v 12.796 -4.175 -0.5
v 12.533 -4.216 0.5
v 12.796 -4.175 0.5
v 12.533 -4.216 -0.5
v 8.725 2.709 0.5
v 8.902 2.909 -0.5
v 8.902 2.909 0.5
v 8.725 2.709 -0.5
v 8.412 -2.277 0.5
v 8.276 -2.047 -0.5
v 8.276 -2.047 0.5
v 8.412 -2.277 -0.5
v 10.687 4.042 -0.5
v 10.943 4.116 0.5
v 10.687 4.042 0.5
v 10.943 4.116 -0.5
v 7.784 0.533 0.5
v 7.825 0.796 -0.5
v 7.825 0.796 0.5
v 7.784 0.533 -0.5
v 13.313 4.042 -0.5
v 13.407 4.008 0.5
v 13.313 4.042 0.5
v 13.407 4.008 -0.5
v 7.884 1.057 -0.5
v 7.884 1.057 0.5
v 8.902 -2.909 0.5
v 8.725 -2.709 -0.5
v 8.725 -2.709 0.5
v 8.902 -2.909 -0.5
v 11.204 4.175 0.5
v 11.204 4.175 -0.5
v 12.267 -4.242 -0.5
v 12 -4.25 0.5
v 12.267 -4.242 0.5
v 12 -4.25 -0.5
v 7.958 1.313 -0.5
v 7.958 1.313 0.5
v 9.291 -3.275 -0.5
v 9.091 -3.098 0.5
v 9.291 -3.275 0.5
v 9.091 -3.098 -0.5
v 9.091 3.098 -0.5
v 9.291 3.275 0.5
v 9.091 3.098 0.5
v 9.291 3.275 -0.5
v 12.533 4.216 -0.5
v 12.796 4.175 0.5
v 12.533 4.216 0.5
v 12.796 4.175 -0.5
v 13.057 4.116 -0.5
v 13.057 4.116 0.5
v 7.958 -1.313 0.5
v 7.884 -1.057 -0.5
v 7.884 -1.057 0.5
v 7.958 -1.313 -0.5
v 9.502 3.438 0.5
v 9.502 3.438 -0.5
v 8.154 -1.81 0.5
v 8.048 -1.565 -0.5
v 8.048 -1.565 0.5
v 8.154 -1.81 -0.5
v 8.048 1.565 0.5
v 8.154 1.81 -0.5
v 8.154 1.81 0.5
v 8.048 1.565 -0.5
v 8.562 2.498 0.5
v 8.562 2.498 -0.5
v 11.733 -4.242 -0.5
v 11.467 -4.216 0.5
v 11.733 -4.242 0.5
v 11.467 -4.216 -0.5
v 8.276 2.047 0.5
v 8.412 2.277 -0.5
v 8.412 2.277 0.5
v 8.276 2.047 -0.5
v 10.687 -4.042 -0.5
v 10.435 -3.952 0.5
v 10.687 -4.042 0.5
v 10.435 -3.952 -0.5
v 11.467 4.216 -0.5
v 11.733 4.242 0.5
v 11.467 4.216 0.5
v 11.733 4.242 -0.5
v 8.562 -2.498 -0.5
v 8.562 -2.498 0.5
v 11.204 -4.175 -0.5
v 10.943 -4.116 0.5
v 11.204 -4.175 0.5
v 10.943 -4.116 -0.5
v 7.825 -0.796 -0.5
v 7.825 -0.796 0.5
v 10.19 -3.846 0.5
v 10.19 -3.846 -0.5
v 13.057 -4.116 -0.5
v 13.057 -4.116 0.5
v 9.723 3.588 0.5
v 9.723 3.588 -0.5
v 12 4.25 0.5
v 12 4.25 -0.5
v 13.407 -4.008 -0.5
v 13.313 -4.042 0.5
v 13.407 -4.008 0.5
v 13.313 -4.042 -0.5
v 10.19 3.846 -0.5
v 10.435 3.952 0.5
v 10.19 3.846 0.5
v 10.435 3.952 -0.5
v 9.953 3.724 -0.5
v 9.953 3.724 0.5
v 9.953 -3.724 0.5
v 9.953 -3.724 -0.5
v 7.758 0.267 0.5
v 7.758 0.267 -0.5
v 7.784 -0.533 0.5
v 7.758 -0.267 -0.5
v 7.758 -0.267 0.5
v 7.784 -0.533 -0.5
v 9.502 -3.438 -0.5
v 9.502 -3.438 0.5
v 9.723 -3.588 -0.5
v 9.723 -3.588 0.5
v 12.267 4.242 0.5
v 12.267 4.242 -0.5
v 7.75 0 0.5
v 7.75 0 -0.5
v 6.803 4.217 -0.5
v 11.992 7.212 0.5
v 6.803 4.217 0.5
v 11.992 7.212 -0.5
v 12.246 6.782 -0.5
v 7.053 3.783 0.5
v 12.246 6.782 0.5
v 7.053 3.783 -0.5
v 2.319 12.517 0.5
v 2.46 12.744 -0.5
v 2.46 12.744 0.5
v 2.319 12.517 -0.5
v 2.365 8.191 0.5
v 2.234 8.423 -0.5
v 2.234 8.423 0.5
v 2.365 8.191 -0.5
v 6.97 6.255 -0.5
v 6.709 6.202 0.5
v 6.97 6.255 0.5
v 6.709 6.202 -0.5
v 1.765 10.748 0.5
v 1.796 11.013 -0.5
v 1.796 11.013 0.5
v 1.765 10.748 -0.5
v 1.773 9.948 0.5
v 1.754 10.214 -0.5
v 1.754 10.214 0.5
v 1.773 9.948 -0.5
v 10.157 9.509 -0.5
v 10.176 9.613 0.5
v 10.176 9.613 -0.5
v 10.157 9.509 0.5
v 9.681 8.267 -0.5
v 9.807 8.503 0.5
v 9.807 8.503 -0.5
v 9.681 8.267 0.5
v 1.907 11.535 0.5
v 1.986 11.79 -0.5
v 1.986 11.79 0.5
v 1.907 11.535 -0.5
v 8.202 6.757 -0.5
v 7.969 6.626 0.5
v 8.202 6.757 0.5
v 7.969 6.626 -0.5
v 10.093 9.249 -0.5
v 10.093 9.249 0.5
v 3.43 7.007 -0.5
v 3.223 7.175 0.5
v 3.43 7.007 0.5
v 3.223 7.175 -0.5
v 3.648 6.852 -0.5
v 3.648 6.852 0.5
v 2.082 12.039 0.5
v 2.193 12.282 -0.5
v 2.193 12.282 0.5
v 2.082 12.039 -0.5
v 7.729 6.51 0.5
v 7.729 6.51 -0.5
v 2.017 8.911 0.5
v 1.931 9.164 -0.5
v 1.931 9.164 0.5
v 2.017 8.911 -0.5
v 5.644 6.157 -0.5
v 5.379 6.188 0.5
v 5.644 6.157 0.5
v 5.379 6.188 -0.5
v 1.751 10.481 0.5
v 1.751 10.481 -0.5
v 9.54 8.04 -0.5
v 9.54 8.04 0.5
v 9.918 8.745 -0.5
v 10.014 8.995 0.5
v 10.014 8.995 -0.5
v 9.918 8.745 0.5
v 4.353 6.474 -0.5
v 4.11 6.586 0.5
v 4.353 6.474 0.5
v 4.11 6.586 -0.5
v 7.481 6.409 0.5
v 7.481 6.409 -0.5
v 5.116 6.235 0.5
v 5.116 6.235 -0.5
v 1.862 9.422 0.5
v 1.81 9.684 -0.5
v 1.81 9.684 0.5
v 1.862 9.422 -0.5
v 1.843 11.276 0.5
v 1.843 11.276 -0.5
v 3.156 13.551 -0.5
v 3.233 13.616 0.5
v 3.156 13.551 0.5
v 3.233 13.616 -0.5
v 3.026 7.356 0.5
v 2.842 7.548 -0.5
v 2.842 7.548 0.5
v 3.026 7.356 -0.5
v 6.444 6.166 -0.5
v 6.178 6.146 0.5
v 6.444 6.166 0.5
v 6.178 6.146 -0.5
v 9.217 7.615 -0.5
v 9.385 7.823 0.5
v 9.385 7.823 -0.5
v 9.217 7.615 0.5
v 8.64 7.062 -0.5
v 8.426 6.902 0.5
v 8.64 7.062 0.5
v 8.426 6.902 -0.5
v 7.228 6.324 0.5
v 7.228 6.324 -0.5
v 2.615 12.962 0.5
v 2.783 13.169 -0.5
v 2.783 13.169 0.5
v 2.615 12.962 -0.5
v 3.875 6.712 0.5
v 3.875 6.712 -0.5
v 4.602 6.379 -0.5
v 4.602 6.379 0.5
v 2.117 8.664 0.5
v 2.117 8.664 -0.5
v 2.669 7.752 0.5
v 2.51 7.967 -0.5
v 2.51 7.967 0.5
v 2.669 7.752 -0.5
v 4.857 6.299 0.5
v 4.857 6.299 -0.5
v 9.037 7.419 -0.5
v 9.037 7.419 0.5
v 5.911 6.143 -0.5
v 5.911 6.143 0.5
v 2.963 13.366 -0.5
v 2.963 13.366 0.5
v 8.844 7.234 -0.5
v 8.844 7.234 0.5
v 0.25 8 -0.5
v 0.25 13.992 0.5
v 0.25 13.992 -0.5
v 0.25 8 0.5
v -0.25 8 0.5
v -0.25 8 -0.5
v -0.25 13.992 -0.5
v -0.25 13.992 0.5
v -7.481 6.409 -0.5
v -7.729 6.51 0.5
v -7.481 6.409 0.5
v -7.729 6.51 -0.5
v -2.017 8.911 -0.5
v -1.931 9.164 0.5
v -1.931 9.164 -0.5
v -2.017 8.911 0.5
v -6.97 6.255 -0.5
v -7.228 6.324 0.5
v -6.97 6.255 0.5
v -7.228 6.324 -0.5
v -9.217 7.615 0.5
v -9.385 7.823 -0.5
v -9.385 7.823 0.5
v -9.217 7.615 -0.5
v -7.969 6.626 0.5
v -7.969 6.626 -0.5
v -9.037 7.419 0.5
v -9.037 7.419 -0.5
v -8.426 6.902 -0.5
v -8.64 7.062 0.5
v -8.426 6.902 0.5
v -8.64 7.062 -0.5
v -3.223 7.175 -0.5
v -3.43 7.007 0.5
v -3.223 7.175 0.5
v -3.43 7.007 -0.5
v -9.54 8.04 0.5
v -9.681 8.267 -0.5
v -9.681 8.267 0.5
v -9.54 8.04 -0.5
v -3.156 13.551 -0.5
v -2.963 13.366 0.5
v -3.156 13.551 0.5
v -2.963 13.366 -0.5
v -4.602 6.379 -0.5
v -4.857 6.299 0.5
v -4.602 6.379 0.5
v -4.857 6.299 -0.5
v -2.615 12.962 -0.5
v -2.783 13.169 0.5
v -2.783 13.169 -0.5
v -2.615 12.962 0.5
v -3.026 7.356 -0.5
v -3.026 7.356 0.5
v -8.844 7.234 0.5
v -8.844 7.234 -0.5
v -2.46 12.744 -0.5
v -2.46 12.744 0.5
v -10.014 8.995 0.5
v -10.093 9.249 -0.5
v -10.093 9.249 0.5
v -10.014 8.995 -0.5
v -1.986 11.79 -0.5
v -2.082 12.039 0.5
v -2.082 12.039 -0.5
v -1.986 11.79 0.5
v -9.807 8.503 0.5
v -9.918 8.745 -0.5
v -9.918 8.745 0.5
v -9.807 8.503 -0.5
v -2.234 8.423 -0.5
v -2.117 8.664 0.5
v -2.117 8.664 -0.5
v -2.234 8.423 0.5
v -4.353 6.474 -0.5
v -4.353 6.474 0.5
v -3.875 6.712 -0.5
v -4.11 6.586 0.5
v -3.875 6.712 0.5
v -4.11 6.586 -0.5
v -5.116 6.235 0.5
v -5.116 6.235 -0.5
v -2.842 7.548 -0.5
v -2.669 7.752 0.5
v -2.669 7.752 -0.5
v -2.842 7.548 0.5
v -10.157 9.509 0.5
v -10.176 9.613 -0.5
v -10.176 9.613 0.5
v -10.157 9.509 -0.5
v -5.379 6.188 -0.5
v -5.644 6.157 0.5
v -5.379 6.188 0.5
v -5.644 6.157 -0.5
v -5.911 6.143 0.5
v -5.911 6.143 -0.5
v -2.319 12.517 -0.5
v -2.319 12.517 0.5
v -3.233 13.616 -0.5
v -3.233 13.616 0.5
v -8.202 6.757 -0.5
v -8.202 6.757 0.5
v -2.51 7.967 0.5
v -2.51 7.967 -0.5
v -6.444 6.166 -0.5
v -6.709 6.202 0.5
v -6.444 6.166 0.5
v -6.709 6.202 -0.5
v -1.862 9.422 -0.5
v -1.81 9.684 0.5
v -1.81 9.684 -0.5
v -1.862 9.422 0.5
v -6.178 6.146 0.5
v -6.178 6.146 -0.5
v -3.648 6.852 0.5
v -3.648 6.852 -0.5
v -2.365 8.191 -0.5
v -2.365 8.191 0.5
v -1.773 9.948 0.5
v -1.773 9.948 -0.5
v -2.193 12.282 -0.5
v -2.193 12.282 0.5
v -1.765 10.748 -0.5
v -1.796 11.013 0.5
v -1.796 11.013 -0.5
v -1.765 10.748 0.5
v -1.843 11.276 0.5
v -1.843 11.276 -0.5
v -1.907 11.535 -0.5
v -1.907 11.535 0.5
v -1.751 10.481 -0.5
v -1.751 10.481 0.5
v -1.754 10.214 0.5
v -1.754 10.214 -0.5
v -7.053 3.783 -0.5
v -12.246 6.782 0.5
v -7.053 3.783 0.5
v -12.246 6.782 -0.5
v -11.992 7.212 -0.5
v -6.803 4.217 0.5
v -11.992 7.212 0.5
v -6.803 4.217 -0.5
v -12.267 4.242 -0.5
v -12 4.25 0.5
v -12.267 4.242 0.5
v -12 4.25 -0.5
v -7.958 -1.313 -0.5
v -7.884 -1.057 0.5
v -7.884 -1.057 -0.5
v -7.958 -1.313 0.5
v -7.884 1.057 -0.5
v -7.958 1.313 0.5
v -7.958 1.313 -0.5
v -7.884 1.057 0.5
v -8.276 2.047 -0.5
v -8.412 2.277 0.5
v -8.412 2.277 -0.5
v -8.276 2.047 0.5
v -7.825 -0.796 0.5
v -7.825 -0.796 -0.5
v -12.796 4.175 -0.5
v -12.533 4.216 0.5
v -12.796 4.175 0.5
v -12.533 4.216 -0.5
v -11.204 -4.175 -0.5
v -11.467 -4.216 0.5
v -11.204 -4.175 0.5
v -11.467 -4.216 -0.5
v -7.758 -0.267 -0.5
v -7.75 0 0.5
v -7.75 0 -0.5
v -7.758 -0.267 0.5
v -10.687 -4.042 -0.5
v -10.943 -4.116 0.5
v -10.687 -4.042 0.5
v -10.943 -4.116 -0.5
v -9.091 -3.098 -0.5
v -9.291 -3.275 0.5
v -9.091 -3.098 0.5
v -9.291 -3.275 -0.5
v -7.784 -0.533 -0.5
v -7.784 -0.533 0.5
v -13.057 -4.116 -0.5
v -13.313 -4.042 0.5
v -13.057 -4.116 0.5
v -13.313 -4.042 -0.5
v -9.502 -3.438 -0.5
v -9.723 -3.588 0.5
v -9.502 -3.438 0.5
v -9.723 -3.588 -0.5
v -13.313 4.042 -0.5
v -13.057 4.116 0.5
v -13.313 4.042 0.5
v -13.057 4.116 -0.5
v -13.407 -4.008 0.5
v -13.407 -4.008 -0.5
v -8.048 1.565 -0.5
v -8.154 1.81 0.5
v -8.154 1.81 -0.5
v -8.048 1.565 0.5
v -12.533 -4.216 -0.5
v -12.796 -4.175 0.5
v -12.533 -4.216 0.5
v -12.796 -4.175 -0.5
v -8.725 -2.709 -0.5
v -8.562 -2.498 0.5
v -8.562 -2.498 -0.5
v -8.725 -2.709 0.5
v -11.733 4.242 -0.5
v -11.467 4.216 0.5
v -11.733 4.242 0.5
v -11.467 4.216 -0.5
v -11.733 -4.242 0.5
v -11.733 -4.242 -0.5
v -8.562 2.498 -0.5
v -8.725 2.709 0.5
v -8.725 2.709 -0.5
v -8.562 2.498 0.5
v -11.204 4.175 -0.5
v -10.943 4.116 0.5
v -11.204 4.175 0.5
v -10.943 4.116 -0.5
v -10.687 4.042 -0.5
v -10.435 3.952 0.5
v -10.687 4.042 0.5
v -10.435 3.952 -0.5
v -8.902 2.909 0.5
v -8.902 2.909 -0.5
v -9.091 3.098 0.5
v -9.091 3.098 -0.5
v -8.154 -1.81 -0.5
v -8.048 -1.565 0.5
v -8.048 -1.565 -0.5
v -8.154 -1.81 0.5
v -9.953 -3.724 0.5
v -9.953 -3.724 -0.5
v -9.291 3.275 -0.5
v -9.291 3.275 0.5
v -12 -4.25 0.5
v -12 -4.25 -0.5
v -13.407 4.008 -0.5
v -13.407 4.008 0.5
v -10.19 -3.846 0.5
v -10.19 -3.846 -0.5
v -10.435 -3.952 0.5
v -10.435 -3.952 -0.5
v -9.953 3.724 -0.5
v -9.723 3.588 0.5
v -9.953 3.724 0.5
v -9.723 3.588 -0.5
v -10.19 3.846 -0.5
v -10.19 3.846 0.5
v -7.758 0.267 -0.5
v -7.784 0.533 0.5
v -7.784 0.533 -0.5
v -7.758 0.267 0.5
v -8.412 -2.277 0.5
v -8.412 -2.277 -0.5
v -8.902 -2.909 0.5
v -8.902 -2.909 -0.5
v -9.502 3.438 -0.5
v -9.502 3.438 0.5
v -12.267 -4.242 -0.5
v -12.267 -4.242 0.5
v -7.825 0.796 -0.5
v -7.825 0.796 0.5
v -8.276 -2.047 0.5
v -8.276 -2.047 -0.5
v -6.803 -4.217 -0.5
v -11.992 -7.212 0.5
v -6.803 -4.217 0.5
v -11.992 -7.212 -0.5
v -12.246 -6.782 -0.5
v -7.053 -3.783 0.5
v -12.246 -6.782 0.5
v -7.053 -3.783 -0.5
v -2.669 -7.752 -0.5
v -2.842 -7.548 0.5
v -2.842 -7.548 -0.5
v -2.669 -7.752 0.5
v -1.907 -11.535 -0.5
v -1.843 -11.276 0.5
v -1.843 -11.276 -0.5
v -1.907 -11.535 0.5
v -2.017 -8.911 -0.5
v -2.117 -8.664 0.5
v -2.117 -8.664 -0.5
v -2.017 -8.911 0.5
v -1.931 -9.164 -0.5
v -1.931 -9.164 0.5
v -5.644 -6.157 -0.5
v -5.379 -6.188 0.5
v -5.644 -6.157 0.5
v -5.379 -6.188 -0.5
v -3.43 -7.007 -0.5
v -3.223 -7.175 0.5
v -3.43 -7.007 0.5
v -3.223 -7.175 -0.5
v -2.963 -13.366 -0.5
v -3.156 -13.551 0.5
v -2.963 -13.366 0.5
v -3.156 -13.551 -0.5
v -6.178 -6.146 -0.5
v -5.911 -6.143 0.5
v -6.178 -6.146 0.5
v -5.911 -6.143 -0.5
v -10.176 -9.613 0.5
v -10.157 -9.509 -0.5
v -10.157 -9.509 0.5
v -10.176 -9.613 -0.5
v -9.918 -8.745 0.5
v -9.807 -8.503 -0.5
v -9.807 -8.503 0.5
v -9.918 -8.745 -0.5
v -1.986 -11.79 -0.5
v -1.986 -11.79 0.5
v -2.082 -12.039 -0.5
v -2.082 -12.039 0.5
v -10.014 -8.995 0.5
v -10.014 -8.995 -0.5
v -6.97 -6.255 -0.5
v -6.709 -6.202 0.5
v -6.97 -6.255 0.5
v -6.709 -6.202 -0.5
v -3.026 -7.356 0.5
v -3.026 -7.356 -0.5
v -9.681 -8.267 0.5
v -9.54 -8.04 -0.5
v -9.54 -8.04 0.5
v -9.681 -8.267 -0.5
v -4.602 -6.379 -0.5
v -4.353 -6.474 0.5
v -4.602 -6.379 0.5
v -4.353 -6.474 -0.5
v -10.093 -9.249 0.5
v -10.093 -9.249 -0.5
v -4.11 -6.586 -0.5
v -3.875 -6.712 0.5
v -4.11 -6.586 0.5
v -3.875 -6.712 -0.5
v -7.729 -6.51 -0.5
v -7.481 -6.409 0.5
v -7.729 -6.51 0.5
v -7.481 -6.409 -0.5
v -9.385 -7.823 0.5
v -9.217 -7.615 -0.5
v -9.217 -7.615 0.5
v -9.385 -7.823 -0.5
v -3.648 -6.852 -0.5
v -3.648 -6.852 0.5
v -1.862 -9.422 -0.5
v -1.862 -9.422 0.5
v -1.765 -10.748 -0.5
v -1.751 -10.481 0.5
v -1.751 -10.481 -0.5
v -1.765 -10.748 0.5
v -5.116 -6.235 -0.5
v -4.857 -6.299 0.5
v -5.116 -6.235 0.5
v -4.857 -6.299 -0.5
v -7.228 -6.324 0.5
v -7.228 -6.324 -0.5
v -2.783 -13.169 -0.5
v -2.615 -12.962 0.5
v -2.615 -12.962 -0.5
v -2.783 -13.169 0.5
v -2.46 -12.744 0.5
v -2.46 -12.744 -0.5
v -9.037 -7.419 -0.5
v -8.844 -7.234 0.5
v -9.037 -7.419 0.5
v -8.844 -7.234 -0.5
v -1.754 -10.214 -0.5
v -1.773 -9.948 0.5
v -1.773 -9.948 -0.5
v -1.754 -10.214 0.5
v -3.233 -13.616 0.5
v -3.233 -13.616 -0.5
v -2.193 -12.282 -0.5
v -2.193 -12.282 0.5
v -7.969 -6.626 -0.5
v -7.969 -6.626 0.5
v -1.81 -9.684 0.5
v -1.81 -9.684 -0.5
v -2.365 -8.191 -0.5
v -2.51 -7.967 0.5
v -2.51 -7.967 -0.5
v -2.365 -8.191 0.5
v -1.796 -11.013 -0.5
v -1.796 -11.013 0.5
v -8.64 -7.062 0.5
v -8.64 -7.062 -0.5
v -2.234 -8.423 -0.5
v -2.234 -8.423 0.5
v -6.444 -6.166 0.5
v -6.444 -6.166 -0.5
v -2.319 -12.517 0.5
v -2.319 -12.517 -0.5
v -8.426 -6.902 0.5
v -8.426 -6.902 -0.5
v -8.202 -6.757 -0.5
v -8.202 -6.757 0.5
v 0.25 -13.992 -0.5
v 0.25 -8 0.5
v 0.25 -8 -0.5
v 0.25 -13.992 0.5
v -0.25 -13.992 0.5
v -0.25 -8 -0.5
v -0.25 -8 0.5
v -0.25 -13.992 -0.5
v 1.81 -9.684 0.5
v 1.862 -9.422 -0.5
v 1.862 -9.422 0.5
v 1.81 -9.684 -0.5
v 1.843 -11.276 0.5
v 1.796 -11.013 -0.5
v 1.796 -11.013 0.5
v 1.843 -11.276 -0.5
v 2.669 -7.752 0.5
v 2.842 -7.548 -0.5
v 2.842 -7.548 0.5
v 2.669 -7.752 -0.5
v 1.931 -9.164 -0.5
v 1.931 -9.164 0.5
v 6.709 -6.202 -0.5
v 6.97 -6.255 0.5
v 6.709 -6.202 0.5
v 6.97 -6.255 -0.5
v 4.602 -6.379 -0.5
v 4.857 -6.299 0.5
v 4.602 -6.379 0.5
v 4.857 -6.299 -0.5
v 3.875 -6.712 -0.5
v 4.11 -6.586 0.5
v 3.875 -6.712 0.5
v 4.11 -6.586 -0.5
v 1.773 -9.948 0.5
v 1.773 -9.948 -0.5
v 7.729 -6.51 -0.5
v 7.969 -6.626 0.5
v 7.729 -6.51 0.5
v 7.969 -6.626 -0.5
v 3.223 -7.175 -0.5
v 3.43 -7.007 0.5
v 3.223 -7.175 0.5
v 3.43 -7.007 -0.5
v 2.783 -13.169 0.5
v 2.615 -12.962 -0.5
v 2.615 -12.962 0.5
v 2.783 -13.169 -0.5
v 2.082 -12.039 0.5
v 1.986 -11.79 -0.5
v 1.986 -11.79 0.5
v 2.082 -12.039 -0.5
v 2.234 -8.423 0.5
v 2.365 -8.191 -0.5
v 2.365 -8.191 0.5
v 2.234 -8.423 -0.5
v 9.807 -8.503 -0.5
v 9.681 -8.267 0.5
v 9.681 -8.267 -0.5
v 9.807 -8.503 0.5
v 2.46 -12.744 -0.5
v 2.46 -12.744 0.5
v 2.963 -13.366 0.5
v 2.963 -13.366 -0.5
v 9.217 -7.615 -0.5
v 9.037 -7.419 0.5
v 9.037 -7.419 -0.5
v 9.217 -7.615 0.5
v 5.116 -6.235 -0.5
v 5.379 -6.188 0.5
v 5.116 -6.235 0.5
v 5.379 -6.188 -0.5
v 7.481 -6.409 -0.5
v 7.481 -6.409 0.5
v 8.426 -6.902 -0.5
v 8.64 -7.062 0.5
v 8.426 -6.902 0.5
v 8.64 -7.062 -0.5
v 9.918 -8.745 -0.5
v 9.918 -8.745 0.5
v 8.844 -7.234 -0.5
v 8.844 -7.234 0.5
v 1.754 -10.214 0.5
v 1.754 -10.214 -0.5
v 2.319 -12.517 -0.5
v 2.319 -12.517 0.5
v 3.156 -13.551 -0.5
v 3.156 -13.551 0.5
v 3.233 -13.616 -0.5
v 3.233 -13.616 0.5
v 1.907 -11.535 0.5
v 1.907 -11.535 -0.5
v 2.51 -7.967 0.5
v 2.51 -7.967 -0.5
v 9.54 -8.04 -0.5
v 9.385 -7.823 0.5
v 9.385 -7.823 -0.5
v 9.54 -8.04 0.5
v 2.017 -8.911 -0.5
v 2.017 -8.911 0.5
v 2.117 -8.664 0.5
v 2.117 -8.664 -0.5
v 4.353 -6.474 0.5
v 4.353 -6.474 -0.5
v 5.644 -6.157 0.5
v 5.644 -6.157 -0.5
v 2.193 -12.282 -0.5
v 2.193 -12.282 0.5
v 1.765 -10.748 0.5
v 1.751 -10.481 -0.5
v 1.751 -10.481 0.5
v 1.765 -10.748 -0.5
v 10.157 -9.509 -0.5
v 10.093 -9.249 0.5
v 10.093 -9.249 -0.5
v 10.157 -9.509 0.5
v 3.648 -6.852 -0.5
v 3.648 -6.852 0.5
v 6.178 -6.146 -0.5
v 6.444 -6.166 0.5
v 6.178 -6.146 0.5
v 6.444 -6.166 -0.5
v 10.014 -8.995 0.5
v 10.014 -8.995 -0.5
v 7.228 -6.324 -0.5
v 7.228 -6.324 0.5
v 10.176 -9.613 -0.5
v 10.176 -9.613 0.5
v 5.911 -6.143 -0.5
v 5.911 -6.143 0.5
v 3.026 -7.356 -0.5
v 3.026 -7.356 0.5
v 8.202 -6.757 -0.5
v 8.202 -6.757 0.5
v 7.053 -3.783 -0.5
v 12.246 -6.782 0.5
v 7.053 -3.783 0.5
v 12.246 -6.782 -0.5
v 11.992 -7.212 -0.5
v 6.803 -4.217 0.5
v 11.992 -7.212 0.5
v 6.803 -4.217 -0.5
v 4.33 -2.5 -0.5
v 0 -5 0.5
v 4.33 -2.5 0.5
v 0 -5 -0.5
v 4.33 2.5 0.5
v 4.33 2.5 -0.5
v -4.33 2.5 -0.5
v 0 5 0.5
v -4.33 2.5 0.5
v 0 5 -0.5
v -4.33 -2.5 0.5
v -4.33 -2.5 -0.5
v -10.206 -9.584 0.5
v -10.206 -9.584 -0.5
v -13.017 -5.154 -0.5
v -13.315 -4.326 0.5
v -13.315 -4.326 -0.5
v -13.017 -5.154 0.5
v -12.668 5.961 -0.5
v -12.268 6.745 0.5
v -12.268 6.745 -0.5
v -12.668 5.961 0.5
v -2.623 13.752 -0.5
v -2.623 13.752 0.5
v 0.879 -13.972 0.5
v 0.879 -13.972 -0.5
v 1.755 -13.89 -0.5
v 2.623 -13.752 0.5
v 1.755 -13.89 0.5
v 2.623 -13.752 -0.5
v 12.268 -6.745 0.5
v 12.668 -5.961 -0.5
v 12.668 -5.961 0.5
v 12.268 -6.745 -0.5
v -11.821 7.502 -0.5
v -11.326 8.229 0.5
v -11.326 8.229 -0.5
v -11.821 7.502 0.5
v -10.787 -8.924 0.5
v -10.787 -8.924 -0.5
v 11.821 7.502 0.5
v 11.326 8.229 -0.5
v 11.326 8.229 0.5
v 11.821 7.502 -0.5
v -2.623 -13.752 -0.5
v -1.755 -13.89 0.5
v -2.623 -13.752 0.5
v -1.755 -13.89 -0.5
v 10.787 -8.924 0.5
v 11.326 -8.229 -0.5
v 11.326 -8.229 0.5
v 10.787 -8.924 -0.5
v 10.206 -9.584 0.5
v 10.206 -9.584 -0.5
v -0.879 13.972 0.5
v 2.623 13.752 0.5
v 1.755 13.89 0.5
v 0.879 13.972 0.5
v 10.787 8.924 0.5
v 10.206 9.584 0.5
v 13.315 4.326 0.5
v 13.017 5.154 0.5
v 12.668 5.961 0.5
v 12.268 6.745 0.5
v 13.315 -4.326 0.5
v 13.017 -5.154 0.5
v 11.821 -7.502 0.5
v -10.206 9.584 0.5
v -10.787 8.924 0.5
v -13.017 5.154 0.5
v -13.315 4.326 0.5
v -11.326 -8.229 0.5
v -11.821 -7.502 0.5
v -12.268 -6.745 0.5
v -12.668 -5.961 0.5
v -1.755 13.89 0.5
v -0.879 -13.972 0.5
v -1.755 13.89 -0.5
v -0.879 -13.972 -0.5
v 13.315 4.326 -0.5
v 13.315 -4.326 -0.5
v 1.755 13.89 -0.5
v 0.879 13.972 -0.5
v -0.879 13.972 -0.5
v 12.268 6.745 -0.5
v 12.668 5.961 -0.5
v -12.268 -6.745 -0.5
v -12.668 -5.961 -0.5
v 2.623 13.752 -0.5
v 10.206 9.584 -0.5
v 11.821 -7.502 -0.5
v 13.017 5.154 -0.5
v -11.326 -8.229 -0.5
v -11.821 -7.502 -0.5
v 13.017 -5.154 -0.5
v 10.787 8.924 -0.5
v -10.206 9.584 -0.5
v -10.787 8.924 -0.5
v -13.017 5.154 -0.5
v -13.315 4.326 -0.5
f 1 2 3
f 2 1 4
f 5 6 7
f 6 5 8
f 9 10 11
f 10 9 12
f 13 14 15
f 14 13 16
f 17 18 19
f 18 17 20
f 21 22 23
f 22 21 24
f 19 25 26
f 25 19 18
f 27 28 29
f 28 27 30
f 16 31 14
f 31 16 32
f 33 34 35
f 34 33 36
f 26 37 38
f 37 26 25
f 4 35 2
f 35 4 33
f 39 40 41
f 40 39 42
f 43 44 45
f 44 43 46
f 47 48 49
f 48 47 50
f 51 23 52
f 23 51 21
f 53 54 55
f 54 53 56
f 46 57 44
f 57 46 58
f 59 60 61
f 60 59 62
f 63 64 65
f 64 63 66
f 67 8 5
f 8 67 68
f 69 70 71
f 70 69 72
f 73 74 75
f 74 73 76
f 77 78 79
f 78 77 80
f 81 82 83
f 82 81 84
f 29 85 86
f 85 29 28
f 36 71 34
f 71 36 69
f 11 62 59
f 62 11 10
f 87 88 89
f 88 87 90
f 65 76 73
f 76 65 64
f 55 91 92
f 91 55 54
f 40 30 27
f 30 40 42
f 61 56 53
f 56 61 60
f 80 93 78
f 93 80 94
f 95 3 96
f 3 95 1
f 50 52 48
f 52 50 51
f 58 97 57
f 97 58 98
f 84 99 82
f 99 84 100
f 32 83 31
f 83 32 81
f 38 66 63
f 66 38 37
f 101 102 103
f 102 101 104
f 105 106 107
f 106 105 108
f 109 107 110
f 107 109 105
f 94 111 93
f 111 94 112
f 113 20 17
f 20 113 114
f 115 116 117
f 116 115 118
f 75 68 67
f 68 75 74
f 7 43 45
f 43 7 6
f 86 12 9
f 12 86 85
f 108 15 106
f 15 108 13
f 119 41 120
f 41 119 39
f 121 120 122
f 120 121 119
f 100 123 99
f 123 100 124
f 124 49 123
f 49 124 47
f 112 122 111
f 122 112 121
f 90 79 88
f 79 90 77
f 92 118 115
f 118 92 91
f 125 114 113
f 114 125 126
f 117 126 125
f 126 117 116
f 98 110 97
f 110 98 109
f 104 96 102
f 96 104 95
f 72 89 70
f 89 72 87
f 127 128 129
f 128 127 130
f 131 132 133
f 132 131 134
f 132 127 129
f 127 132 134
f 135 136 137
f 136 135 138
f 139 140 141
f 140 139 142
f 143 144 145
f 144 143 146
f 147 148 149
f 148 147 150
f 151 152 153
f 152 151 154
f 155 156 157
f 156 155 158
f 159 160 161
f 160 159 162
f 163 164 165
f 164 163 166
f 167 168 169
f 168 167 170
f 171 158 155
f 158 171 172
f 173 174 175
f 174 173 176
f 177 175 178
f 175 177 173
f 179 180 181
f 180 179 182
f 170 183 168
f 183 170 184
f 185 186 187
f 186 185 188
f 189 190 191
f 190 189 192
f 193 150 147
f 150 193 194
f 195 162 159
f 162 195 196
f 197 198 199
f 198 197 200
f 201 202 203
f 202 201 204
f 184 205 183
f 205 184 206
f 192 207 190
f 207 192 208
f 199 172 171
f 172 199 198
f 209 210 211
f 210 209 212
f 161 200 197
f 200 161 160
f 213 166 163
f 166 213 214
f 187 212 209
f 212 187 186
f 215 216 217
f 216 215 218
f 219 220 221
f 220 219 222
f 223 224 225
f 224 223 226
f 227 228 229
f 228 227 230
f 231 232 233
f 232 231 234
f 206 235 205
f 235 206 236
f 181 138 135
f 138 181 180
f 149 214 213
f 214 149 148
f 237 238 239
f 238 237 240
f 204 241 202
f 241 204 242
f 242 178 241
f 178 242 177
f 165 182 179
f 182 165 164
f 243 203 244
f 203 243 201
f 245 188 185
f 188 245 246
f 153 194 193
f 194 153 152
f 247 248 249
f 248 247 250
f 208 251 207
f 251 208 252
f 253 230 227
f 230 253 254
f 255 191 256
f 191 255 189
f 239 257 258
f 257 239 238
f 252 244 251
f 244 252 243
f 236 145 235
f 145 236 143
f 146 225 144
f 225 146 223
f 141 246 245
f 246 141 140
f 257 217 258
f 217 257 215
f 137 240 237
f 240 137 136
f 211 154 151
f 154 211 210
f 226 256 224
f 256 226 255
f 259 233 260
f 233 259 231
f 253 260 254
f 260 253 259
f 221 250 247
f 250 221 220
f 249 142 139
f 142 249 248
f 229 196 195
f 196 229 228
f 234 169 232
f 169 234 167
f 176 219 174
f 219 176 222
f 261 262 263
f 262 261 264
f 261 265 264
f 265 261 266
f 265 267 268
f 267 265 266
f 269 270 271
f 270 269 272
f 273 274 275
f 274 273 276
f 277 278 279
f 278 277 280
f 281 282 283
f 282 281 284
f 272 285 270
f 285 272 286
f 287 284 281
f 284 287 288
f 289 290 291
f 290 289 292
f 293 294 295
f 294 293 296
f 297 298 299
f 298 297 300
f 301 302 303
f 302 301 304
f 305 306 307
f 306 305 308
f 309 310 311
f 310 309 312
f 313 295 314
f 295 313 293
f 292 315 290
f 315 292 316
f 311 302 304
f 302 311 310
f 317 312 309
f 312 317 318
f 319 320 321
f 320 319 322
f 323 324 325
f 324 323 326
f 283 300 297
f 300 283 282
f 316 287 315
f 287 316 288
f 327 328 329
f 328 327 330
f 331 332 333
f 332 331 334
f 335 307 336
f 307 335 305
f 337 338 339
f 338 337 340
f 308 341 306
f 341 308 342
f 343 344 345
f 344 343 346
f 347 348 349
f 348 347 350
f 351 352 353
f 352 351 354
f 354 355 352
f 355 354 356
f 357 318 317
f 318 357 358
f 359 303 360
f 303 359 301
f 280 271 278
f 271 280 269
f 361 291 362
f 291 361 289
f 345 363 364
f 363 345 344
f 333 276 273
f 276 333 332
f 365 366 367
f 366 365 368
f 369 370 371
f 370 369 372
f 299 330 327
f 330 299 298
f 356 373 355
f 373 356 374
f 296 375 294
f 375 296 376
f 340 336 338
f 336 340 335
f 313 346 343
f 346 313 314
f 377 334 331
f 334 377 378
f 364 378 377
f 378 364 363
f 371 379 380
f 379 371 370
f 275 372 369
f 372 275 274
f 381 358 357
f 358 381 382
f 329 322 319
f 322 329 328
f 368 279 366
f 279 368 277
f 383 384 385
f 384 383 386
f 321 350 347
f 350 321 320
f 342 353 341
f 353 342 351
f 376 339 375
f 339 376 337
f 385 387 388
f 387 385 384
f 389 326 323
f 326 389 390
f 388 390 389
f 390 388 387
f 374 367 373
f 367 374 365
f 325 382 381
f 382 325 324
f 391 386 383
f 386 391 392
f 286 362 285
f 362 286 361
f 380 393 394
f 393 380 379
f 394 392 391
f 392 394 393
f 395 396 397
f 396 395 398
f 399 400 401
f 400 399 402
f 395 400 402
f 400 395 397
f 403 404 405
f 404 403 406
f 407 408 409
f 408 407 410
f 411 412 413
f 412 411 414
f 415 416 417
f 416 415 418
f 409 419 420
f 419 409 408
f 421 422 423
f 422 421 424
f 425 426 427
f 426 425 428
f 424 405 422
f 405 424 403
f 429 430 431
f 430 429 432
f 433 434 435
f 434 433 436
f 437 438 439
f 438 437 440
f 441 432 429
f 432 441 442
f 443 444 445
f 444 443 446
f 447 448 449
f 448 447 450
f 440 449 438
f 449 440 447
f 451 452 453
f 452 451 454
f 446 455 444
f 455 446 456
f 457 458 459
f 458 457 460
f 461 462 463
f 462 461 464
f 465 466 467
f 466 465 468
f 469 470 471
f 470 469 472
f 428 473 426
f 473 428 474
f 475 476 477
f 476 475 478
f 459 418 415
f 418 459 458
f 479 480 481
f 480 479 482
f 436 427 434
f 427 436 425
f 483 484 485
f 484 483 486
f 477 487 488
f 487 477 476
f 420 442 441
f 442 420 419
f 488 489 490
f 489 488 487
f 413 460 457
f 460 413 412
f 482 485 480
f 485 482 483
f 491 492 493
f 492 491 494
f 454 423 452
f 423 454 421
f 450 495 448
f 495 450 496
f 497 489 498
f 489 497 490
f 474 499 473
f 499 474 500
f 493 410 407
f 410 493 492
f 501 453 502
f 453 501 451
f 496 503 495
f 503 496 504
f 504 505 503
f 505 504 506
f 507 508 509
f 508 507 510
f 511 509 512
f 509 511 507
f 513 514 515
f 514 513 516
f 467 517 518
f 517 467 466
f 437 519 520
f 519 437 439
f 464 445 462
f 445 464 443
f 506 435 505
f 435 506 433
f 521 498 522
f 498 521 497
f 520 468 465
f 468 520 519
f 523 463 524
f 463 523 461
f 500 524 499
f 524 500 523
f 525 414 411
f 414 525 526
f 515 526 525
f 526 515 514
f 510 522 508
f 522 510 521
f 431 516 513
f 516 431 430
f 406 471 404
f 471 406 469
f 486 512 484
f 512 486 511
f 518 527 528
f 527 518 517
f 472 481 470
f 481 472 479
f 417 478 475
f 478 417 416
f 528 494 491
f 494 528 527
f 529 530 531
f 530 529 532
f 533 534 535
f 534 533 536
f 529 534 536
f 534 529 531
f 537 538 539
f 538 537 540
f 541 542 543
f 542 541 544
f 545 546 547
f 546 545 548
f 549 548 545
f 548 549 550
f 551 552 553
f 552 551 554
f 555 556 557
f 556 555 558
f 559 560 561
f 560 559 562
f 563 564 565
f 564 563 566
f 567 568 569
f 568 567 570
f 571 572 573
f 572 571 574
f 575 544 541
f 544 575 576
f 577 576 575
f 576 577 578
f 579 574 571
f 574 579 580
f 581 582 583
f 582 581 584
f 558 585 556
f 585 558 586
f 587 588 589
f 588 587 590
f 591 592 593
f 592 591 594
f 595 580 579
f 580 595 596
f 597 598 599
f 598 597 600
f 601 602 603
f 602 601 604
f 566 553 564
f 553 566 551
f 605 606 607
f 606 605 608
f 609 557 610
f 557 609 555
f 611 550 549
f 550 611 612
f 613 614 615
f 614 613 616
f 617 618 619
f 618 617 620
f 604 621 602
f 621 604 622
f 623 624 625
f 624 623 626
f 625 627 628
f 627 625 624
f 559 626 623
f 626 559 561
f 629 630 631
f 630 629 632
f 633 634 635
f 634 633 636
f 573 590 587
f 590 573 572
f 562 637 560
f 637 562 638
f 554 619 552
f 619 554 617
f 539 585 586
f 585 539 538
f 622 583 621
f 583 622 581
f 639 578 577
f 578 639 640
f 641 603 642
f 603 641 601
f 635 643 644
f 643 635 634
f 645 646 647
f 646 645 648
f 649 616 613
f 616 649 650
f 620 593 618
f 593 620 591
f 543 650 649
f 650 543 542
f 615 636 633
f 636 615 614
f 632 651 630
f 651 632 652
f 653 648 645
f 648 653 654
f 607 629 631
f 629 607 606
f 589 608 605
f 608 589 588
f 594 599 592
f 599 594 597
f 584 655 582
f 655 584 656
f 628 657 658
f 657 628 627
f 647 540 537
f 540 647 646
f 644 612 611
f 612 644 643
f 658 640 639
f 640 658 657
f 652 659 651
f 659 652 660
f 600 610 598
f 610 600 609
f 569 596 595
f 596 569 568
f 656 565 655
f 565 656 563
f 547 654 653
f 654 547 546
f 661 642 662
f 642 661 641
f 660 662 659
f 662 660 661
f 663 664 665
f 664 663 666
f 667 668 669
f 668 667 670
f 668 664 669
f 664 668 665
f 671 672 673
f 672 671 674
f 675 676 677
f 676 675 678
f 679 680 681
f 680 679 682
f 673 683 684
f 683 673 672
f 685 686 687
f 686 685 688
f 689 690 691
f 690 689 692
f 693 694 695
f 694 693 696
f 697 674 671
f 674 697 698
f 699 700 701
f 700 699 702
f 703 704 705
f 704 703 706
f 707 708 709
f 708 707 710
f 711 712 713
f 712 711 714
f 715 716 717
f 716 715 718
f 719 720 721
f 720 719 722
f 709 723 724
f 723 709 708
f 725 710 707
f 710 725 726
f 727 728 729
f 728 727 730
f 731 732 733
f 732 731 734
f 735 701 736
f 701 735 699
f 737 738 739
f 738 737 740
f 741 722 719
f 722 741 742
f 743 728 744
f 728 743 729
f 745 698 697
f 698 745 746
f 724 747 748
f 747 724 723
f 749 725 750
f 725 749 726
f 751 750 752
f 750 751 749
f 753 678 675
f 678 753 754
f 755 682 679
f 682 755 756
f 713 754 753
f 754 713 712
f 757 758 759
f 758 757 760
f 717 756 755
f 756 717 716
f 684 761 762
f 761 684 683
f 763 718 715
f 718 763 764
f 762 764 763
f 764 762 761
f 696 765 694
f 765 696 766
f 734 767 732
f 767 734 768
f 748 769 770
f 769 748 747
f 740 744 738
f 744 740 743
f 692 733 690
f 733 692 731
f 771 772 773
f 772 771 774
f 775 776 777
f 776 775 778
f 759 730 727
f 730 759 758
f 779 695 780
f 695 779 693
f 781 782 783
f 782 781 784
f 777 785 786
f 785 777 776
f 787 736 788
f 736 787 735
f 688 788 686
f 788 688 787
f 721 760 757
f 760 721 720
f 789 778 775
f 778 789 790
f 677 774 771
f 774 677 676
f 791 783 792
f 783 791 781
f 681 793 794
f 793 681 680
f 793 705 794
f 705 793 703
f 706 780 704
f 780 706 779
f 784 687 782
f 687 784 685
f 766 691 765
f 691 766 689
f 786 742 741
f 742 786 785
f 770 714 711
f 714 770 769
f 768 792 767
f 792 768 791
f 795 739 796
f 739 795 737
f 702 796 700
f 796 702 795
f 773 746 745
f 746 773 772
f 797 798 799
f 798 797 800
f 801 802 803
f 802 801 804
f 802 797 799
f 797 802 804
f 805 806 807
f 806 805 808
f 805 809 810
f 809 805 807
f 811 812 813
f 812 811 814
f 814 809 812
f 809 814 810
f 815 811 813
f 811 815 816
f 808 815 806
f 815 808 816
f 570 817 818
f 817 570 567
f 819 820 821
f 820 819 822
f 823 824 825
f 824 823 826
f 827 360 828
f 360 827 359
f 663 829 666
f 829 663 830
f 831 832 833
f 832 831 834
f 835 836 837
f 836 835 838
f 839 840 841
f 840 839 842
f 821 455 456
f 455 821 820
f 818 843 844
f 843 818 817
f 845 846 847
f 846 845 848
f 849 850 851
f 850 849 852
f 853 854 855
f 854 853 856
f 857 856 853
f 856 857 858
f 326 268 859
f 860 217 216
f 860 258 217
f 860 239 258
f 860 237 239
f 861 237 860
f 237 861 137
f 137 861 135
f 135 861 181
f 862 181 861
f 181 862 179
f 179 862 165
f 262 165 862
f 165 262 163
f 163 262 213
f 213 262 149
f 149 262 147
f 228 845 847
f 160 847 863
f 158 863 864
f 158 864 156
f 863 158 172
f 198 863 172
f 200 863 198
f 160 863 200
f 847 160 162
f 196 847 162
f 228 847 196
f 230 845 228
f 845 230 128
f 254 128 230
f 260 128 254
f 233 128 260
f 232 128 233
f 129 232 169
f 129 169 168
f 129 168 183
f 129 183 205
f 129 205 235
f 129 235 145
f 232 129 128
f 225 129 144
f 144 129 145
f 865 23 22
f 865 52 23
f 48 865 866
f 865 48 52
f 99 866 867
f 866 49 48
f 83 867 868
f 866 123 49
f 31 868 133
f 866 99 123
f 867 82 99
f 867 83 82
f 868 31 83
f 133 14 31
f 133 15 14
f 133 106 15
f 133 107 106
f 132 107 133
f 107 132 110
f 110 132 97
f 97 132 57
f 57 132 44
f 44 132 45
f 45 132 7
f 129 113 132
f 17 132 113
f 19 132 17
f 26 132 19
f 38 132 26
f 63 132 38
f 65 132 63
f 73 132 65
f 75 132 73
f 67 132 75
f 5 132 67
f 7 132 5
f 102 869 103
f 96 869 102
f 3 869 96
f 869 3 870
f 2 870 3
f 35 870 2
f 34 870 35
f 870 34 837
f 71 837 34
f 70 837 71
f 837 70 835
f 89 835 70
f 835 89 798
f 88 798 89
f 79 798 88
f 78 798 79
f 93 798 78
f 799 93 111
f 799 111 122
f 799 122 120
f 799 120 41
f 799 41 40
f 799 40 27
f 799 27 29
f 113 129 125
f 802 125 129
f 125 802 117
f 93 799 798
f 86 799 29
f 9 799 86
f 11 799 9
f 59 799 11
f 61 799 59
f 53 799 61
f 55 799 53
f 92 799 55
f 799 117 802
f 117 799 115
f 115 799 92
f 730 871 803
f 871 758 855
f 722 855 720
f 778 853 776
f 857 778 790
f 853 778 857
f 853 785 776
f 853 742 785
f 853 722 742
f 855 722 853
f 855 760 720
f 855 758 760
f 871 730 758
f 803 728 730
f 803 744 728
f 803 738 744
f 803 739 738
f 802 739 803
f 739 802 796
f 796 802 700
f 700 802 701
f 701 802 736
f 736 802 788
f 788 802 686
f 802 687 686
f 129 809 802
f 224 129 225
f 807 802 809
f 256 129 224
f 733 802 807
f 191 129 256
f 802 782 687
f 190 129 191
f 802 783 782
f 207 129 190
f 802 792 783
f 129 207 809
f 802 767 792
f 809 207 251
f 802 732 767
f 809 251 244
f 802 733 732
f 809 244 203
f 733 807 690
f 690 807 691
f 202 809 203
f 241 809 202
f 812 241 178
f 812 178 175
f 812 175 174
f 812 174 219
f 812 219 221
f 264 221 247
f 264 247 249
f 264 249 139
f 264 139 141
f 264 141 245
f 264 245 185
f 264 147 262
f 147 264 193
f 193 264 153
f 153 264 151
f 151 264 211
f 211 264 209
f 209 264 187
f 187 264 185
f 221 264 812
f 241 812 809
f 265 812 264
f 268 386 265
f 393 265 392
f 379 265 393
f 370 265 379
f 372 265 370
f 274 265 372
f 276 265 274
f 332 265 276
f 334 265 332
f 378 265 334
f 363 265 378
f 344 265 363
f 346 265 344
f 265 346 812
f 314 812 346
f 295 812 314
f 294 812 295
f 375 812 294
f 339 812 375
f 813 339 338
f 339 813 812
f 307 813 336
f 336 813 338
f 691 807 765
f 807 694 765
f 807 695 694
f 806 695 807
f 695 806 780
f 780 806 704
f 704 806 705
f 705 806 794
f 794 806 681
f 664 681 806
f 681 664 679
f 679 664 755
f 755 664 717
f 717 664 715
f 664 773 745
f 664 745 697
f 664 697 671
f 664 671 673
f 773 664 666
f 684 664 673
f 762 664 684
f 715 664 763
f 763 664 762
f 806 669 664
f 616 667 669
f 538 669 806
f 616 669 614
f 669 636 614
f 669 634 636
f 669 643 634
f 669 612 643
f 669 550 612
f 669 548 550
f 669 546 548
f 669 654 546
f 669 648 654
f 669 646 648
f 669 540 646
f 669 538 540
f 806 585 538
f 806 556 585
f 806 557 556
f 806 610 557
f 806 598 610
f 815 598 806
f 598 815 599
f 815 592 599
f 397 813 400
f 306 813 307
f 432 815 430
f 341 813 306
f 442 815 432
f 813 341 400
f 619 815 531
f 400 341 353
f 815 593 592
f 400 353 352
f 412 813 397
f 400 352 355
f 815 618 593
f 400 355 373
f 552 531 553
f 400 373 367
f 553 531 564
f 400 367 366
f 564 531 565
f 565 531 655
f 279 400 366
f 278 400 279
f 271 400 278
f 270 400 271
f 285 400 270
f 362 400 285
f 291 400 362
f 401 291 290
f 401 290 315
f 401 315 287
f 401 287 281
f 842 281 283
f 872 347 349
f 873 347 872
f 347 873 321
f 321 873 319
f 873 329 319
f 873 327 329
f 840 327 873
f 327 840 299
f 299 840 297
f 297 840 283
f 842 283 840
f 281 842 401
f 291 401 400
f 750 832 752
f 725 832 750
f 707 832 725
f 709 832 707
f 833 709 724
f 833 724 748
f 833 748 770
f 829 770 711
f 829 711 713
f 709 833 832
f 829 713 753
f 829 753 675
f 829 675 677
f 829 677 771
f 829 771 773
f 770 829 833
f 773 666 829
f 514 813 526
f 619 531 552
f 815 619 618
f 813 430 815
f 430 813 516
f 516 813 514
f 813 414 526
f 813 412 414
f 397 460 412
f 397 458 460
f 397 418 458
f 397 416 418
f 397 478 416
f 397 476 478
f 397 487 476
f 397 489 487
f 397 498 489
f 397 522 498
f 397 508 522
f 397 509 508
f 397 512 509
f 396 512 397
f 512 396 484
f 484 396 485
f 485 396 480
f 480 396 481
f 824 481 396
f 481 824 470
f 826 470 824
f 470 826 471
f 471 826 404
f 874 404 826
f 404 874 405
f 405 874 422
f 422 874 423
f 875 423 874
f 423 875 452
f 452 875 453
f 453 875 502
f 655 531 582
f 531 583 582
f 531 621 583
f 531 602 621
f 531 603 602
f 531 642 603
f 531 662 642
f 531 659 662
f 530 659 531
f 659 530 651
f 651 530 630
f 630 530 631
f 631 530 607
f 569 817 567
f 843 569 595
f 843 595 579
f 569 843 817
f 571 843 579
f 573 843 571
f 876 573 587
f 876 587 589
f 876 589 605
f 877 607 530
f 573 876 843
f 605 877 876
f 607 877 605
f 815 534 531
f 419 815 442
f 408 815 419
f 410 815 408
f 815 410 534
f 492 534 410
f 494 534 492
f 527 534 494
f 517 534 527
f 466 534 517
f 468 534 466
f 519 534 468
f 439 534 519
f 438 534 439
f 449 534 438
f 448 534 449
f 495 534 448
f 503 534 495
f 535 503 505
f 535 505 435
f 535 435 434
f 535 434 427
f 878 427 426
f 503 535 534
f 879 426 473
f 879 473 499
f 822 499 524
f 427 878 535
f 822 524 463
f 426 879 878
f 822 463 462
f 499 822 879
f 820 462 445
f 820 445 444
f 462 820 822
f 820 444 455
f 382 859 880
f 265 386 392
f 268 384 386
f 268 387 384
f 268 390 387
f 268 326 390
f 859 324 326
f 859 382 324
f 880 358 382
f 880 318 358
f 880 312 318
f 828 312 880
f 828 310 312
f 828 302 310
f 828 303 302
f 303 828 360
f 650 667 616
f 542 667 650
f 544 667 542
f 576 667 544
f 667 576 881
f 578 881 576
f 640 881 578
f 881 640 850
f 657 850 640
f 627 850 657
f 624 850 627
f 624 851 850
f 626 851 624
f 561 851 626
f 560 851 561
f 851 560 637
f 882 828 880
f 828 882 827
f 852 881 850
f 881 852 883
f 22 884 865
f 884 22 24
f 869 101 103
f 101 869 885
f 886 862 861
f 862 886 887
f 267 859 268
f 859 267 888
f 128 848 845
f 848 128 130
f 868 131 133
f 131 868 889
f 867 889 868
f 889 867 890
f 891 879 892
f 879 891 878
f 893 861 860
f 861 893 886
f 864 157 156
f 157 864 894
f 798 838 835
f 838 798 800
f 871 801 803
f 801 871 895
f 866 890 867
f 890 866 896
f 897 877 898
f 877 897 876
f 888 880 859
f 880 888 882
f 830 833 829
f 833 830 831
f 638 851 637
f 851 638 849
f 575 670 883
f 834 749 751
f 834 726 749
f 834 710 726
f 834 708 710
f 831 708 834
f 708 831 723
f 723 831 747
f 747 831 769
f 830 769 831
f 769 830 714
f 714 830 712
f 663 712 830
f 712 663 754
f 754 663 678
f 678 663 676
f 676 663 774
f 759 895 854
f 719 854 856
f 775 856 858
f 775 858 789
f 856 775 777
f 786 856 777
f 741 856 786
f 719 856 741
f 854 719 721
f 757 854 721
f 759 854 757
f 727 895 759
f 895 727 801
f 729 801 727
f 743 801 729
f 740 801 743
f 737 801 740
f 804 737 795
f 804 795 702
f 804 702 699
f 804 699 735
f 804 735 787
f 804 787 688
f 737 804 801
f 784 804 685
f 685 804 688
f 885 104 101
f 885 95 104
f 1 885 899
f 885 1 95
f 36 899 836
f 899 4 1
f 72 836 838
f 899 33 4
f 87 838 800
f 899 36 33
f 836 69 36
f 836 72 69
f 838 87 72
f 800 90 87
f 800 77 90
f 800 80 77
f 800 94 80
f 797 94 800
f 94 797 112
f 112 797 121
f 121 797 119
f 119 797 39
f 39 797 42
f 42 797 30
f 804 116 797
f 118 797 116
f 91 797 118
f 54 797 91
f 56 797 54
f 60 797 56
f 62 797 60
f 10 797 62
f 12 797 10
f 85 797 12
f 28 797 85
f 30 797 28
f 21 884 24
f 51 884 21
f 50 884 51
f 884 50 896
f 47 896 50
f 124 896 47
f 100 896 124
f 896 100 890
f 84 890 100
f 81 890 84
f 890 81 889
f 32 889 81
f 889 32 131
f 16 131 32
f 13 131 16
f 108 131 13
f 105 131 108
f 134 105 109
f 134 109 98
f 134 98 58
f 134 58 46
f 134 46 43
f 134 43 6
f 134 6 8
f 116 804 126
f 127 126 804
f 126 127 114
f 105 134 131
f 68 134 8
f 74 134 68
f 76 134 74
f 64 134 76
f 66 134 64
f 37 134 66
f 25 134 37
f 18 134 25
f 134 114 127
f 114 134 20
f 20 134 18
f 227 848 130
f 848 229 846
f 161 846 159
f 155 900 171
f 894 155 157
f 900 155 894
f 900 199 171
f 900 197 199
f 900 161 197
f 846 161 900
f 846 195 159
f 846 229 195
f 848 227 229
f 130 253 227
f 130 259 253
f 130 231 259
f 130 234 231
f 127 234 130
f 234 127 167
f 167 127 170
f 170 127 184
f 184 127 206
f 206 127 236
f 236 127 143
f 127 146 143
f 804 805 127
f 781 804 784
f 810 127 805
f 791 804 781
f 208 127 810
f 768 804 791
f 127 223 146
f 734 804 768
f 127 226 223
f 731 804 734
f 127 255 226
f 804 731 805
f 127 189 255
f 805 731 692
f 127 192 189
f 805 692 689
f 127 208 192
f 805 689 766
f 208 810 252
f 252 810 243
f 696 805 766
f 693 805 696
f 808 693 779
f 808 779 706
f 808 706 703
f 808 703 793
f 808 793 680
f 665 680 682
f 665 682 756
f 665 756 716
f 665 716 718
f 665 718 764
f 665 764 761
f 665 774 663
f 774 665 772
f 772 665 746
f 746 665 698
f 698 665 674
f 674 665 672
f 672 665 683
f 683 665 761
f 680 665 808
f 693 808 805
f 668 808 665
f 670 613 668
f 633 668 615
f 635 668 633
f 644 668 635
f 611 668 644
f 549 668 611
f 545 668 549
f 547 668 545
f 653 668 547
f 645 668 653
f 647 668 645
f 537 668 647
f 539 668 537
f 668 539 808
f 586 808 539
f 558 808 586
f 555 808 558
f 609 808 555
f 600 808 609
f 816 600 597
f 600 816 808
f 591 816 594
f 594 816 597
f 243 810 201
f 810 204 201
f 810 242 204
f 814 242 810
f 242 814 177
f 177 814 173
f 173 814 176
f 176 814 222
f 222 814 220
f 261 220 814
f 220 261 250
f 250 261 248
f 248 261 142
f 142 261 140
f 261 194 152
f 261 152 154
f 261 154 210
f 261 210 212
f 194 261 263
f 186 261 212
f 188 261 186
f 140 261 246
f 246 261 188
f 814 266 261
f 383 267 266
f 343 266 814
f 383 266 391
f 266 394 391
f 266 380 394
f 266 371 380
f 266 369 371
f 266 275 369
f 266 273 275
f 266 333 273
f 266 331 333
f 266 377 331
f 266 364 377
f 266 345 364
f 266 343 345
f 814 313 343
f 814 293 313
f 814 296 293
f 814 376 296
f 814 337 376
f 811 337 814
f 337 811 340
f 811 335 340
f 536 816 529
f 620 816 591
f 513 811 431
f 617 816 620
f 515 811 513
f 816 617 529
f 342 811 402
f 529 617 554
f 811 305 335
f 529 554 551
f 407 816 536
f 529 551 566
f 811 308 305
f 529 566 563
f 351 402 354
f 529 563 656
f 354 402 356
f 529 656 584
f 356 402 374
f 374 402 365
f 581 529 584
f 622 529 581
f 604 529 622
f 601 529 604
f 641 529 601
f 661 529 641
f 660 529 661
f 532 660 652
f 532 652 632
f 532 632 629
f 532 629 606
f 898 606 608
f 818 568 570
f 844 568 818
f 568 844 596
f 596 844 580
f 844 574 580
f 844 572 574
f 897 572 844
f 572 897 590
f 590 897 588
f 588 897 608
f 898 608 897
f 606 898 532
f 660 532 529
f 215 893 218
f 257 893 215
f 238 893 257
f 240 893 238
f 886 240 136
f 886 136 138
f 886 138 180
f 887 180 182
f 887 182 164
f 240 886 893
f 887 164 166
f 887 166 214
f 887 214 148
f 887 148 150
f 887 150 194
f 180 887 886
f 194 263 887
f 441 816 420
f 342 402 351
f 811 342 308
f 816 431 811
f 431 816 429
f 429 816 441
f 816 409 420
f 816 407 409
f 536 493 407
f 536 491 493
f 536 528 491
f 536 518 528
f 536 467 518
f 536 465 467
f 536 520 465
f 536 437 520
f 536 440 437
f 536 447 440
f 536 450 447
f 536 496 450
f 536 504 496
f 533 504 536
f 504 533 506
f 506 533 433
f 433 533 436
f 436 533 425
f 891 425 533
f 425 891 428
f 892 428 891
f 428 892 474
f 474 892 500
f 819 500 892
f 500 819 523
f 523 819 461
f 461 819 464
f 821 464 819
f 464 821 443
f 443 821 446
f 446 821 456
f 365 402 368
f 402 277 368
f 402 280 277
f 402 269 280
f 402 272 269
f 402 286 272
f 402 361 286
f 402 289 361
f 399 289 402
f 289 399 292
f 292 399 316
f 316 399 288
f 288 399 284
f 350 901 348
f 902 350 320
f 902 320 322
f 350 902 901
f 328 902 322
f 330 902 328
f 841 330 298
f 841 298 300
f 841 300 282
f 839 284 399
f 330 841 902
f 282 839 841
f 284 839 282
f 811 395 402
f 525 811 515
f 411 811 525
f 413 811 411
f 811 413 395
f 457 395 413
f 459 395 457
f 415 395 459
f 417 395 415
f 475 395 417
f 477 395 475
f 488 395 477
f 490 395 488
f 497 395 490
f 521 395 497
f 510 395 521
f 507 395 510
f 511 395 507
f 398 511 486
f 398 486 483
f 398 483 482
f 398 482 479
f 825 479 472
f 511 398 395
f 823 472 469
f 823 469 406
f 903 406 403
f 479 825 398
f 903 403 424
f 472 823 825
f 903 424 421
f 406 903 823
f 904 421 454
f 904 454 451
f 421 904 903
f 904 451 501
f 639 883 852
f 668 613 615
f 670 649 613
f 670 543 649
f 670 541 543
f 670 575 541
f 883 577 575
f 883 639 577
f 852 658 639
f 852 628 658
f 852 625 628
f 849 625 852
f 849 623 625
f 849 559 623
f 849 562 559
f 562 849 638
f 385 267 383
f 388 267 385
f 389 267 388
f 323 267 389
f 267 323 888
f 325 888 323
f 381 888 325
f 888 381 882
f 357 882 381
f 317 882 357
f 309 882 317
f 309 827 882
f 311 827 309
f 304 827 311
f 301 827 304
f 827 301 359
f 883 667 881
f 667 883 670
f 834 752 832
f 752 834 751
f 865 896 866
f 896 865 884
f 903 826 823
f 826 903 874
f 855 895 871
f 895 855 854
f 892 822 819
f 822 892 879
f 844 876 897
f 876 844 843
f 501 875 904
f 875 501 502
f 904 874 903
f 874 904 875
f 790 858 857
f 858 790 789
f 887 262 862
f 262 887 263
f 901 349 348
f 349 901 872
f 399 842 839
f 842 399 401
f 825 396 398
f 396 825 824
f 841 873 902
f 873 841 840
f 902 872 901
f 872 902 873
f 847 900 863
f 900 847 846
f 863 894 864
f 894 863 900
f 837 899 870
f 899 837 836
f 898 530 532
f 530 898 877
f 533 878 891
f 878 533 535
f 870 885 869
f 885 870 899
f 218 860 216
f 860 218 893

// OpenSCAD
// This is a Moon Clip.
//
// Warning -- some sanding and fitting may be required.
//
// This is licensed under the creative commons+attribution license
//
// To fulfil the attribution requirement, please link to:
// http://www.thingiverse.com/thing:2677639

/* [Main] */

// Define type of output
shape=1; // [0:2D for Laser or Water Jet Cutting,1:3D for printing]

// Define inner shape
inner_shape=0; // [0:for polygon,1:for round]

// Define number of faces (more faces for smoother surfaces)
$fn=100;

// Define thickness in mm
thickness=1.0;

// Define number of rounds
num_rounds=6;

// Define outside diameter in mm
outside_diameter=28.0;

// Define inside diameter in mm
inside_diameter=10.0;

// Define notch diameter in mm
notch_diameter=8.5;

// Define center-to-center notch offset in mm
notch_offset=12.0;

// Define slot width in mm
slot_width=0.5;

// Define slot length in mm
slot_length=6.0;

// Define slot offset in mm
slot_offset=outside_diameter/2-slot_length/2;

module outer_body2d()
{
    circle(outside_diameter/2,true);
}

module polygon_inner_body2d()
{
    $fn=(num_rounds);
    rotate([0,0,(360/num_rounds)/2])
    circle(inside_diameter/2,true);
}

module round_inner_body2d()
{
    rotate([0,0,(360/num_rounds)/2])
    circle(inside_diameter/2,true);
}

module notch2d()
{
    #translate([notch_offset,0.0]) circle(notch_diameter/2,true);
    //translate([1.0*outside_diameter,0.0]) square(notch_diameter,true);
}
module slot2d()
{
    translate([slot_offset,0.0]) square([slot_length,slot_width],true);
}

module outer_body3d()
{
    cylinder(h=thickness,r=outside_diameter/2,center=true);
}

module polygon_inner_body3d()
{
    $fn=(num_rounds);
    rotate([0,0,(360/num_rounds)/2])
    cylinder(h=thickness+1,r=inside_diameter/2,center=true);
}

module round_inner_body3d()
{
    rotate([0,0,(360/num_rounds)/2])
    cylinder(h=thickness+1,r=inside_diameter/2,center=true);
}

module notch3d()
{
    translate([notch_offset,0.0,0.0]) cylinder(h=thickness+1,r=notch_diameter/2,center=true);
    //translate([1.0*outside_diameter,0.0,thickness/2]) square(notch_diameter,true);
}
module slot3d()
{
    translate([slot_offset,0.0,0])
    rotate(90,0,0)
    #cube([slot_width,slot_length,thickness+1],center=true);
    // Add cylinder at end of slot to round corners for stress relief
}

if(shape==0)
{
    difference()
    {
        outer_body2d();
        union()
    {
        if(inner_shape==1)
        {
            round_inner_body2d();
        }
        if(inner_shape==0)
        {
            polygon_inner_body2d();
        }
            for(angle=[0:360/num_rounds:360])
            {
                rotate([0,0,angle]) notch2d();
                rotate([0,0,angle+360/(2*num_rounds)]) slot2d();
            }
        }
    }
}

if(shape==1)
{
    difference()
    {
        outer_body3d();
        union()
    {
            if(inner_shape==1)
            {
                round_inner_body3d();
            }
            if(inner_shape==0)
            {
                polygon_inner_body3d();
            }
            for(angle=[0:360/num_rounds:360])
            {
                rotate([0,0,angle]) notch3d();
                rotate([0,0,angle+360/(2*num_rounds)]) slot3d();
            }
        }
    }
}
